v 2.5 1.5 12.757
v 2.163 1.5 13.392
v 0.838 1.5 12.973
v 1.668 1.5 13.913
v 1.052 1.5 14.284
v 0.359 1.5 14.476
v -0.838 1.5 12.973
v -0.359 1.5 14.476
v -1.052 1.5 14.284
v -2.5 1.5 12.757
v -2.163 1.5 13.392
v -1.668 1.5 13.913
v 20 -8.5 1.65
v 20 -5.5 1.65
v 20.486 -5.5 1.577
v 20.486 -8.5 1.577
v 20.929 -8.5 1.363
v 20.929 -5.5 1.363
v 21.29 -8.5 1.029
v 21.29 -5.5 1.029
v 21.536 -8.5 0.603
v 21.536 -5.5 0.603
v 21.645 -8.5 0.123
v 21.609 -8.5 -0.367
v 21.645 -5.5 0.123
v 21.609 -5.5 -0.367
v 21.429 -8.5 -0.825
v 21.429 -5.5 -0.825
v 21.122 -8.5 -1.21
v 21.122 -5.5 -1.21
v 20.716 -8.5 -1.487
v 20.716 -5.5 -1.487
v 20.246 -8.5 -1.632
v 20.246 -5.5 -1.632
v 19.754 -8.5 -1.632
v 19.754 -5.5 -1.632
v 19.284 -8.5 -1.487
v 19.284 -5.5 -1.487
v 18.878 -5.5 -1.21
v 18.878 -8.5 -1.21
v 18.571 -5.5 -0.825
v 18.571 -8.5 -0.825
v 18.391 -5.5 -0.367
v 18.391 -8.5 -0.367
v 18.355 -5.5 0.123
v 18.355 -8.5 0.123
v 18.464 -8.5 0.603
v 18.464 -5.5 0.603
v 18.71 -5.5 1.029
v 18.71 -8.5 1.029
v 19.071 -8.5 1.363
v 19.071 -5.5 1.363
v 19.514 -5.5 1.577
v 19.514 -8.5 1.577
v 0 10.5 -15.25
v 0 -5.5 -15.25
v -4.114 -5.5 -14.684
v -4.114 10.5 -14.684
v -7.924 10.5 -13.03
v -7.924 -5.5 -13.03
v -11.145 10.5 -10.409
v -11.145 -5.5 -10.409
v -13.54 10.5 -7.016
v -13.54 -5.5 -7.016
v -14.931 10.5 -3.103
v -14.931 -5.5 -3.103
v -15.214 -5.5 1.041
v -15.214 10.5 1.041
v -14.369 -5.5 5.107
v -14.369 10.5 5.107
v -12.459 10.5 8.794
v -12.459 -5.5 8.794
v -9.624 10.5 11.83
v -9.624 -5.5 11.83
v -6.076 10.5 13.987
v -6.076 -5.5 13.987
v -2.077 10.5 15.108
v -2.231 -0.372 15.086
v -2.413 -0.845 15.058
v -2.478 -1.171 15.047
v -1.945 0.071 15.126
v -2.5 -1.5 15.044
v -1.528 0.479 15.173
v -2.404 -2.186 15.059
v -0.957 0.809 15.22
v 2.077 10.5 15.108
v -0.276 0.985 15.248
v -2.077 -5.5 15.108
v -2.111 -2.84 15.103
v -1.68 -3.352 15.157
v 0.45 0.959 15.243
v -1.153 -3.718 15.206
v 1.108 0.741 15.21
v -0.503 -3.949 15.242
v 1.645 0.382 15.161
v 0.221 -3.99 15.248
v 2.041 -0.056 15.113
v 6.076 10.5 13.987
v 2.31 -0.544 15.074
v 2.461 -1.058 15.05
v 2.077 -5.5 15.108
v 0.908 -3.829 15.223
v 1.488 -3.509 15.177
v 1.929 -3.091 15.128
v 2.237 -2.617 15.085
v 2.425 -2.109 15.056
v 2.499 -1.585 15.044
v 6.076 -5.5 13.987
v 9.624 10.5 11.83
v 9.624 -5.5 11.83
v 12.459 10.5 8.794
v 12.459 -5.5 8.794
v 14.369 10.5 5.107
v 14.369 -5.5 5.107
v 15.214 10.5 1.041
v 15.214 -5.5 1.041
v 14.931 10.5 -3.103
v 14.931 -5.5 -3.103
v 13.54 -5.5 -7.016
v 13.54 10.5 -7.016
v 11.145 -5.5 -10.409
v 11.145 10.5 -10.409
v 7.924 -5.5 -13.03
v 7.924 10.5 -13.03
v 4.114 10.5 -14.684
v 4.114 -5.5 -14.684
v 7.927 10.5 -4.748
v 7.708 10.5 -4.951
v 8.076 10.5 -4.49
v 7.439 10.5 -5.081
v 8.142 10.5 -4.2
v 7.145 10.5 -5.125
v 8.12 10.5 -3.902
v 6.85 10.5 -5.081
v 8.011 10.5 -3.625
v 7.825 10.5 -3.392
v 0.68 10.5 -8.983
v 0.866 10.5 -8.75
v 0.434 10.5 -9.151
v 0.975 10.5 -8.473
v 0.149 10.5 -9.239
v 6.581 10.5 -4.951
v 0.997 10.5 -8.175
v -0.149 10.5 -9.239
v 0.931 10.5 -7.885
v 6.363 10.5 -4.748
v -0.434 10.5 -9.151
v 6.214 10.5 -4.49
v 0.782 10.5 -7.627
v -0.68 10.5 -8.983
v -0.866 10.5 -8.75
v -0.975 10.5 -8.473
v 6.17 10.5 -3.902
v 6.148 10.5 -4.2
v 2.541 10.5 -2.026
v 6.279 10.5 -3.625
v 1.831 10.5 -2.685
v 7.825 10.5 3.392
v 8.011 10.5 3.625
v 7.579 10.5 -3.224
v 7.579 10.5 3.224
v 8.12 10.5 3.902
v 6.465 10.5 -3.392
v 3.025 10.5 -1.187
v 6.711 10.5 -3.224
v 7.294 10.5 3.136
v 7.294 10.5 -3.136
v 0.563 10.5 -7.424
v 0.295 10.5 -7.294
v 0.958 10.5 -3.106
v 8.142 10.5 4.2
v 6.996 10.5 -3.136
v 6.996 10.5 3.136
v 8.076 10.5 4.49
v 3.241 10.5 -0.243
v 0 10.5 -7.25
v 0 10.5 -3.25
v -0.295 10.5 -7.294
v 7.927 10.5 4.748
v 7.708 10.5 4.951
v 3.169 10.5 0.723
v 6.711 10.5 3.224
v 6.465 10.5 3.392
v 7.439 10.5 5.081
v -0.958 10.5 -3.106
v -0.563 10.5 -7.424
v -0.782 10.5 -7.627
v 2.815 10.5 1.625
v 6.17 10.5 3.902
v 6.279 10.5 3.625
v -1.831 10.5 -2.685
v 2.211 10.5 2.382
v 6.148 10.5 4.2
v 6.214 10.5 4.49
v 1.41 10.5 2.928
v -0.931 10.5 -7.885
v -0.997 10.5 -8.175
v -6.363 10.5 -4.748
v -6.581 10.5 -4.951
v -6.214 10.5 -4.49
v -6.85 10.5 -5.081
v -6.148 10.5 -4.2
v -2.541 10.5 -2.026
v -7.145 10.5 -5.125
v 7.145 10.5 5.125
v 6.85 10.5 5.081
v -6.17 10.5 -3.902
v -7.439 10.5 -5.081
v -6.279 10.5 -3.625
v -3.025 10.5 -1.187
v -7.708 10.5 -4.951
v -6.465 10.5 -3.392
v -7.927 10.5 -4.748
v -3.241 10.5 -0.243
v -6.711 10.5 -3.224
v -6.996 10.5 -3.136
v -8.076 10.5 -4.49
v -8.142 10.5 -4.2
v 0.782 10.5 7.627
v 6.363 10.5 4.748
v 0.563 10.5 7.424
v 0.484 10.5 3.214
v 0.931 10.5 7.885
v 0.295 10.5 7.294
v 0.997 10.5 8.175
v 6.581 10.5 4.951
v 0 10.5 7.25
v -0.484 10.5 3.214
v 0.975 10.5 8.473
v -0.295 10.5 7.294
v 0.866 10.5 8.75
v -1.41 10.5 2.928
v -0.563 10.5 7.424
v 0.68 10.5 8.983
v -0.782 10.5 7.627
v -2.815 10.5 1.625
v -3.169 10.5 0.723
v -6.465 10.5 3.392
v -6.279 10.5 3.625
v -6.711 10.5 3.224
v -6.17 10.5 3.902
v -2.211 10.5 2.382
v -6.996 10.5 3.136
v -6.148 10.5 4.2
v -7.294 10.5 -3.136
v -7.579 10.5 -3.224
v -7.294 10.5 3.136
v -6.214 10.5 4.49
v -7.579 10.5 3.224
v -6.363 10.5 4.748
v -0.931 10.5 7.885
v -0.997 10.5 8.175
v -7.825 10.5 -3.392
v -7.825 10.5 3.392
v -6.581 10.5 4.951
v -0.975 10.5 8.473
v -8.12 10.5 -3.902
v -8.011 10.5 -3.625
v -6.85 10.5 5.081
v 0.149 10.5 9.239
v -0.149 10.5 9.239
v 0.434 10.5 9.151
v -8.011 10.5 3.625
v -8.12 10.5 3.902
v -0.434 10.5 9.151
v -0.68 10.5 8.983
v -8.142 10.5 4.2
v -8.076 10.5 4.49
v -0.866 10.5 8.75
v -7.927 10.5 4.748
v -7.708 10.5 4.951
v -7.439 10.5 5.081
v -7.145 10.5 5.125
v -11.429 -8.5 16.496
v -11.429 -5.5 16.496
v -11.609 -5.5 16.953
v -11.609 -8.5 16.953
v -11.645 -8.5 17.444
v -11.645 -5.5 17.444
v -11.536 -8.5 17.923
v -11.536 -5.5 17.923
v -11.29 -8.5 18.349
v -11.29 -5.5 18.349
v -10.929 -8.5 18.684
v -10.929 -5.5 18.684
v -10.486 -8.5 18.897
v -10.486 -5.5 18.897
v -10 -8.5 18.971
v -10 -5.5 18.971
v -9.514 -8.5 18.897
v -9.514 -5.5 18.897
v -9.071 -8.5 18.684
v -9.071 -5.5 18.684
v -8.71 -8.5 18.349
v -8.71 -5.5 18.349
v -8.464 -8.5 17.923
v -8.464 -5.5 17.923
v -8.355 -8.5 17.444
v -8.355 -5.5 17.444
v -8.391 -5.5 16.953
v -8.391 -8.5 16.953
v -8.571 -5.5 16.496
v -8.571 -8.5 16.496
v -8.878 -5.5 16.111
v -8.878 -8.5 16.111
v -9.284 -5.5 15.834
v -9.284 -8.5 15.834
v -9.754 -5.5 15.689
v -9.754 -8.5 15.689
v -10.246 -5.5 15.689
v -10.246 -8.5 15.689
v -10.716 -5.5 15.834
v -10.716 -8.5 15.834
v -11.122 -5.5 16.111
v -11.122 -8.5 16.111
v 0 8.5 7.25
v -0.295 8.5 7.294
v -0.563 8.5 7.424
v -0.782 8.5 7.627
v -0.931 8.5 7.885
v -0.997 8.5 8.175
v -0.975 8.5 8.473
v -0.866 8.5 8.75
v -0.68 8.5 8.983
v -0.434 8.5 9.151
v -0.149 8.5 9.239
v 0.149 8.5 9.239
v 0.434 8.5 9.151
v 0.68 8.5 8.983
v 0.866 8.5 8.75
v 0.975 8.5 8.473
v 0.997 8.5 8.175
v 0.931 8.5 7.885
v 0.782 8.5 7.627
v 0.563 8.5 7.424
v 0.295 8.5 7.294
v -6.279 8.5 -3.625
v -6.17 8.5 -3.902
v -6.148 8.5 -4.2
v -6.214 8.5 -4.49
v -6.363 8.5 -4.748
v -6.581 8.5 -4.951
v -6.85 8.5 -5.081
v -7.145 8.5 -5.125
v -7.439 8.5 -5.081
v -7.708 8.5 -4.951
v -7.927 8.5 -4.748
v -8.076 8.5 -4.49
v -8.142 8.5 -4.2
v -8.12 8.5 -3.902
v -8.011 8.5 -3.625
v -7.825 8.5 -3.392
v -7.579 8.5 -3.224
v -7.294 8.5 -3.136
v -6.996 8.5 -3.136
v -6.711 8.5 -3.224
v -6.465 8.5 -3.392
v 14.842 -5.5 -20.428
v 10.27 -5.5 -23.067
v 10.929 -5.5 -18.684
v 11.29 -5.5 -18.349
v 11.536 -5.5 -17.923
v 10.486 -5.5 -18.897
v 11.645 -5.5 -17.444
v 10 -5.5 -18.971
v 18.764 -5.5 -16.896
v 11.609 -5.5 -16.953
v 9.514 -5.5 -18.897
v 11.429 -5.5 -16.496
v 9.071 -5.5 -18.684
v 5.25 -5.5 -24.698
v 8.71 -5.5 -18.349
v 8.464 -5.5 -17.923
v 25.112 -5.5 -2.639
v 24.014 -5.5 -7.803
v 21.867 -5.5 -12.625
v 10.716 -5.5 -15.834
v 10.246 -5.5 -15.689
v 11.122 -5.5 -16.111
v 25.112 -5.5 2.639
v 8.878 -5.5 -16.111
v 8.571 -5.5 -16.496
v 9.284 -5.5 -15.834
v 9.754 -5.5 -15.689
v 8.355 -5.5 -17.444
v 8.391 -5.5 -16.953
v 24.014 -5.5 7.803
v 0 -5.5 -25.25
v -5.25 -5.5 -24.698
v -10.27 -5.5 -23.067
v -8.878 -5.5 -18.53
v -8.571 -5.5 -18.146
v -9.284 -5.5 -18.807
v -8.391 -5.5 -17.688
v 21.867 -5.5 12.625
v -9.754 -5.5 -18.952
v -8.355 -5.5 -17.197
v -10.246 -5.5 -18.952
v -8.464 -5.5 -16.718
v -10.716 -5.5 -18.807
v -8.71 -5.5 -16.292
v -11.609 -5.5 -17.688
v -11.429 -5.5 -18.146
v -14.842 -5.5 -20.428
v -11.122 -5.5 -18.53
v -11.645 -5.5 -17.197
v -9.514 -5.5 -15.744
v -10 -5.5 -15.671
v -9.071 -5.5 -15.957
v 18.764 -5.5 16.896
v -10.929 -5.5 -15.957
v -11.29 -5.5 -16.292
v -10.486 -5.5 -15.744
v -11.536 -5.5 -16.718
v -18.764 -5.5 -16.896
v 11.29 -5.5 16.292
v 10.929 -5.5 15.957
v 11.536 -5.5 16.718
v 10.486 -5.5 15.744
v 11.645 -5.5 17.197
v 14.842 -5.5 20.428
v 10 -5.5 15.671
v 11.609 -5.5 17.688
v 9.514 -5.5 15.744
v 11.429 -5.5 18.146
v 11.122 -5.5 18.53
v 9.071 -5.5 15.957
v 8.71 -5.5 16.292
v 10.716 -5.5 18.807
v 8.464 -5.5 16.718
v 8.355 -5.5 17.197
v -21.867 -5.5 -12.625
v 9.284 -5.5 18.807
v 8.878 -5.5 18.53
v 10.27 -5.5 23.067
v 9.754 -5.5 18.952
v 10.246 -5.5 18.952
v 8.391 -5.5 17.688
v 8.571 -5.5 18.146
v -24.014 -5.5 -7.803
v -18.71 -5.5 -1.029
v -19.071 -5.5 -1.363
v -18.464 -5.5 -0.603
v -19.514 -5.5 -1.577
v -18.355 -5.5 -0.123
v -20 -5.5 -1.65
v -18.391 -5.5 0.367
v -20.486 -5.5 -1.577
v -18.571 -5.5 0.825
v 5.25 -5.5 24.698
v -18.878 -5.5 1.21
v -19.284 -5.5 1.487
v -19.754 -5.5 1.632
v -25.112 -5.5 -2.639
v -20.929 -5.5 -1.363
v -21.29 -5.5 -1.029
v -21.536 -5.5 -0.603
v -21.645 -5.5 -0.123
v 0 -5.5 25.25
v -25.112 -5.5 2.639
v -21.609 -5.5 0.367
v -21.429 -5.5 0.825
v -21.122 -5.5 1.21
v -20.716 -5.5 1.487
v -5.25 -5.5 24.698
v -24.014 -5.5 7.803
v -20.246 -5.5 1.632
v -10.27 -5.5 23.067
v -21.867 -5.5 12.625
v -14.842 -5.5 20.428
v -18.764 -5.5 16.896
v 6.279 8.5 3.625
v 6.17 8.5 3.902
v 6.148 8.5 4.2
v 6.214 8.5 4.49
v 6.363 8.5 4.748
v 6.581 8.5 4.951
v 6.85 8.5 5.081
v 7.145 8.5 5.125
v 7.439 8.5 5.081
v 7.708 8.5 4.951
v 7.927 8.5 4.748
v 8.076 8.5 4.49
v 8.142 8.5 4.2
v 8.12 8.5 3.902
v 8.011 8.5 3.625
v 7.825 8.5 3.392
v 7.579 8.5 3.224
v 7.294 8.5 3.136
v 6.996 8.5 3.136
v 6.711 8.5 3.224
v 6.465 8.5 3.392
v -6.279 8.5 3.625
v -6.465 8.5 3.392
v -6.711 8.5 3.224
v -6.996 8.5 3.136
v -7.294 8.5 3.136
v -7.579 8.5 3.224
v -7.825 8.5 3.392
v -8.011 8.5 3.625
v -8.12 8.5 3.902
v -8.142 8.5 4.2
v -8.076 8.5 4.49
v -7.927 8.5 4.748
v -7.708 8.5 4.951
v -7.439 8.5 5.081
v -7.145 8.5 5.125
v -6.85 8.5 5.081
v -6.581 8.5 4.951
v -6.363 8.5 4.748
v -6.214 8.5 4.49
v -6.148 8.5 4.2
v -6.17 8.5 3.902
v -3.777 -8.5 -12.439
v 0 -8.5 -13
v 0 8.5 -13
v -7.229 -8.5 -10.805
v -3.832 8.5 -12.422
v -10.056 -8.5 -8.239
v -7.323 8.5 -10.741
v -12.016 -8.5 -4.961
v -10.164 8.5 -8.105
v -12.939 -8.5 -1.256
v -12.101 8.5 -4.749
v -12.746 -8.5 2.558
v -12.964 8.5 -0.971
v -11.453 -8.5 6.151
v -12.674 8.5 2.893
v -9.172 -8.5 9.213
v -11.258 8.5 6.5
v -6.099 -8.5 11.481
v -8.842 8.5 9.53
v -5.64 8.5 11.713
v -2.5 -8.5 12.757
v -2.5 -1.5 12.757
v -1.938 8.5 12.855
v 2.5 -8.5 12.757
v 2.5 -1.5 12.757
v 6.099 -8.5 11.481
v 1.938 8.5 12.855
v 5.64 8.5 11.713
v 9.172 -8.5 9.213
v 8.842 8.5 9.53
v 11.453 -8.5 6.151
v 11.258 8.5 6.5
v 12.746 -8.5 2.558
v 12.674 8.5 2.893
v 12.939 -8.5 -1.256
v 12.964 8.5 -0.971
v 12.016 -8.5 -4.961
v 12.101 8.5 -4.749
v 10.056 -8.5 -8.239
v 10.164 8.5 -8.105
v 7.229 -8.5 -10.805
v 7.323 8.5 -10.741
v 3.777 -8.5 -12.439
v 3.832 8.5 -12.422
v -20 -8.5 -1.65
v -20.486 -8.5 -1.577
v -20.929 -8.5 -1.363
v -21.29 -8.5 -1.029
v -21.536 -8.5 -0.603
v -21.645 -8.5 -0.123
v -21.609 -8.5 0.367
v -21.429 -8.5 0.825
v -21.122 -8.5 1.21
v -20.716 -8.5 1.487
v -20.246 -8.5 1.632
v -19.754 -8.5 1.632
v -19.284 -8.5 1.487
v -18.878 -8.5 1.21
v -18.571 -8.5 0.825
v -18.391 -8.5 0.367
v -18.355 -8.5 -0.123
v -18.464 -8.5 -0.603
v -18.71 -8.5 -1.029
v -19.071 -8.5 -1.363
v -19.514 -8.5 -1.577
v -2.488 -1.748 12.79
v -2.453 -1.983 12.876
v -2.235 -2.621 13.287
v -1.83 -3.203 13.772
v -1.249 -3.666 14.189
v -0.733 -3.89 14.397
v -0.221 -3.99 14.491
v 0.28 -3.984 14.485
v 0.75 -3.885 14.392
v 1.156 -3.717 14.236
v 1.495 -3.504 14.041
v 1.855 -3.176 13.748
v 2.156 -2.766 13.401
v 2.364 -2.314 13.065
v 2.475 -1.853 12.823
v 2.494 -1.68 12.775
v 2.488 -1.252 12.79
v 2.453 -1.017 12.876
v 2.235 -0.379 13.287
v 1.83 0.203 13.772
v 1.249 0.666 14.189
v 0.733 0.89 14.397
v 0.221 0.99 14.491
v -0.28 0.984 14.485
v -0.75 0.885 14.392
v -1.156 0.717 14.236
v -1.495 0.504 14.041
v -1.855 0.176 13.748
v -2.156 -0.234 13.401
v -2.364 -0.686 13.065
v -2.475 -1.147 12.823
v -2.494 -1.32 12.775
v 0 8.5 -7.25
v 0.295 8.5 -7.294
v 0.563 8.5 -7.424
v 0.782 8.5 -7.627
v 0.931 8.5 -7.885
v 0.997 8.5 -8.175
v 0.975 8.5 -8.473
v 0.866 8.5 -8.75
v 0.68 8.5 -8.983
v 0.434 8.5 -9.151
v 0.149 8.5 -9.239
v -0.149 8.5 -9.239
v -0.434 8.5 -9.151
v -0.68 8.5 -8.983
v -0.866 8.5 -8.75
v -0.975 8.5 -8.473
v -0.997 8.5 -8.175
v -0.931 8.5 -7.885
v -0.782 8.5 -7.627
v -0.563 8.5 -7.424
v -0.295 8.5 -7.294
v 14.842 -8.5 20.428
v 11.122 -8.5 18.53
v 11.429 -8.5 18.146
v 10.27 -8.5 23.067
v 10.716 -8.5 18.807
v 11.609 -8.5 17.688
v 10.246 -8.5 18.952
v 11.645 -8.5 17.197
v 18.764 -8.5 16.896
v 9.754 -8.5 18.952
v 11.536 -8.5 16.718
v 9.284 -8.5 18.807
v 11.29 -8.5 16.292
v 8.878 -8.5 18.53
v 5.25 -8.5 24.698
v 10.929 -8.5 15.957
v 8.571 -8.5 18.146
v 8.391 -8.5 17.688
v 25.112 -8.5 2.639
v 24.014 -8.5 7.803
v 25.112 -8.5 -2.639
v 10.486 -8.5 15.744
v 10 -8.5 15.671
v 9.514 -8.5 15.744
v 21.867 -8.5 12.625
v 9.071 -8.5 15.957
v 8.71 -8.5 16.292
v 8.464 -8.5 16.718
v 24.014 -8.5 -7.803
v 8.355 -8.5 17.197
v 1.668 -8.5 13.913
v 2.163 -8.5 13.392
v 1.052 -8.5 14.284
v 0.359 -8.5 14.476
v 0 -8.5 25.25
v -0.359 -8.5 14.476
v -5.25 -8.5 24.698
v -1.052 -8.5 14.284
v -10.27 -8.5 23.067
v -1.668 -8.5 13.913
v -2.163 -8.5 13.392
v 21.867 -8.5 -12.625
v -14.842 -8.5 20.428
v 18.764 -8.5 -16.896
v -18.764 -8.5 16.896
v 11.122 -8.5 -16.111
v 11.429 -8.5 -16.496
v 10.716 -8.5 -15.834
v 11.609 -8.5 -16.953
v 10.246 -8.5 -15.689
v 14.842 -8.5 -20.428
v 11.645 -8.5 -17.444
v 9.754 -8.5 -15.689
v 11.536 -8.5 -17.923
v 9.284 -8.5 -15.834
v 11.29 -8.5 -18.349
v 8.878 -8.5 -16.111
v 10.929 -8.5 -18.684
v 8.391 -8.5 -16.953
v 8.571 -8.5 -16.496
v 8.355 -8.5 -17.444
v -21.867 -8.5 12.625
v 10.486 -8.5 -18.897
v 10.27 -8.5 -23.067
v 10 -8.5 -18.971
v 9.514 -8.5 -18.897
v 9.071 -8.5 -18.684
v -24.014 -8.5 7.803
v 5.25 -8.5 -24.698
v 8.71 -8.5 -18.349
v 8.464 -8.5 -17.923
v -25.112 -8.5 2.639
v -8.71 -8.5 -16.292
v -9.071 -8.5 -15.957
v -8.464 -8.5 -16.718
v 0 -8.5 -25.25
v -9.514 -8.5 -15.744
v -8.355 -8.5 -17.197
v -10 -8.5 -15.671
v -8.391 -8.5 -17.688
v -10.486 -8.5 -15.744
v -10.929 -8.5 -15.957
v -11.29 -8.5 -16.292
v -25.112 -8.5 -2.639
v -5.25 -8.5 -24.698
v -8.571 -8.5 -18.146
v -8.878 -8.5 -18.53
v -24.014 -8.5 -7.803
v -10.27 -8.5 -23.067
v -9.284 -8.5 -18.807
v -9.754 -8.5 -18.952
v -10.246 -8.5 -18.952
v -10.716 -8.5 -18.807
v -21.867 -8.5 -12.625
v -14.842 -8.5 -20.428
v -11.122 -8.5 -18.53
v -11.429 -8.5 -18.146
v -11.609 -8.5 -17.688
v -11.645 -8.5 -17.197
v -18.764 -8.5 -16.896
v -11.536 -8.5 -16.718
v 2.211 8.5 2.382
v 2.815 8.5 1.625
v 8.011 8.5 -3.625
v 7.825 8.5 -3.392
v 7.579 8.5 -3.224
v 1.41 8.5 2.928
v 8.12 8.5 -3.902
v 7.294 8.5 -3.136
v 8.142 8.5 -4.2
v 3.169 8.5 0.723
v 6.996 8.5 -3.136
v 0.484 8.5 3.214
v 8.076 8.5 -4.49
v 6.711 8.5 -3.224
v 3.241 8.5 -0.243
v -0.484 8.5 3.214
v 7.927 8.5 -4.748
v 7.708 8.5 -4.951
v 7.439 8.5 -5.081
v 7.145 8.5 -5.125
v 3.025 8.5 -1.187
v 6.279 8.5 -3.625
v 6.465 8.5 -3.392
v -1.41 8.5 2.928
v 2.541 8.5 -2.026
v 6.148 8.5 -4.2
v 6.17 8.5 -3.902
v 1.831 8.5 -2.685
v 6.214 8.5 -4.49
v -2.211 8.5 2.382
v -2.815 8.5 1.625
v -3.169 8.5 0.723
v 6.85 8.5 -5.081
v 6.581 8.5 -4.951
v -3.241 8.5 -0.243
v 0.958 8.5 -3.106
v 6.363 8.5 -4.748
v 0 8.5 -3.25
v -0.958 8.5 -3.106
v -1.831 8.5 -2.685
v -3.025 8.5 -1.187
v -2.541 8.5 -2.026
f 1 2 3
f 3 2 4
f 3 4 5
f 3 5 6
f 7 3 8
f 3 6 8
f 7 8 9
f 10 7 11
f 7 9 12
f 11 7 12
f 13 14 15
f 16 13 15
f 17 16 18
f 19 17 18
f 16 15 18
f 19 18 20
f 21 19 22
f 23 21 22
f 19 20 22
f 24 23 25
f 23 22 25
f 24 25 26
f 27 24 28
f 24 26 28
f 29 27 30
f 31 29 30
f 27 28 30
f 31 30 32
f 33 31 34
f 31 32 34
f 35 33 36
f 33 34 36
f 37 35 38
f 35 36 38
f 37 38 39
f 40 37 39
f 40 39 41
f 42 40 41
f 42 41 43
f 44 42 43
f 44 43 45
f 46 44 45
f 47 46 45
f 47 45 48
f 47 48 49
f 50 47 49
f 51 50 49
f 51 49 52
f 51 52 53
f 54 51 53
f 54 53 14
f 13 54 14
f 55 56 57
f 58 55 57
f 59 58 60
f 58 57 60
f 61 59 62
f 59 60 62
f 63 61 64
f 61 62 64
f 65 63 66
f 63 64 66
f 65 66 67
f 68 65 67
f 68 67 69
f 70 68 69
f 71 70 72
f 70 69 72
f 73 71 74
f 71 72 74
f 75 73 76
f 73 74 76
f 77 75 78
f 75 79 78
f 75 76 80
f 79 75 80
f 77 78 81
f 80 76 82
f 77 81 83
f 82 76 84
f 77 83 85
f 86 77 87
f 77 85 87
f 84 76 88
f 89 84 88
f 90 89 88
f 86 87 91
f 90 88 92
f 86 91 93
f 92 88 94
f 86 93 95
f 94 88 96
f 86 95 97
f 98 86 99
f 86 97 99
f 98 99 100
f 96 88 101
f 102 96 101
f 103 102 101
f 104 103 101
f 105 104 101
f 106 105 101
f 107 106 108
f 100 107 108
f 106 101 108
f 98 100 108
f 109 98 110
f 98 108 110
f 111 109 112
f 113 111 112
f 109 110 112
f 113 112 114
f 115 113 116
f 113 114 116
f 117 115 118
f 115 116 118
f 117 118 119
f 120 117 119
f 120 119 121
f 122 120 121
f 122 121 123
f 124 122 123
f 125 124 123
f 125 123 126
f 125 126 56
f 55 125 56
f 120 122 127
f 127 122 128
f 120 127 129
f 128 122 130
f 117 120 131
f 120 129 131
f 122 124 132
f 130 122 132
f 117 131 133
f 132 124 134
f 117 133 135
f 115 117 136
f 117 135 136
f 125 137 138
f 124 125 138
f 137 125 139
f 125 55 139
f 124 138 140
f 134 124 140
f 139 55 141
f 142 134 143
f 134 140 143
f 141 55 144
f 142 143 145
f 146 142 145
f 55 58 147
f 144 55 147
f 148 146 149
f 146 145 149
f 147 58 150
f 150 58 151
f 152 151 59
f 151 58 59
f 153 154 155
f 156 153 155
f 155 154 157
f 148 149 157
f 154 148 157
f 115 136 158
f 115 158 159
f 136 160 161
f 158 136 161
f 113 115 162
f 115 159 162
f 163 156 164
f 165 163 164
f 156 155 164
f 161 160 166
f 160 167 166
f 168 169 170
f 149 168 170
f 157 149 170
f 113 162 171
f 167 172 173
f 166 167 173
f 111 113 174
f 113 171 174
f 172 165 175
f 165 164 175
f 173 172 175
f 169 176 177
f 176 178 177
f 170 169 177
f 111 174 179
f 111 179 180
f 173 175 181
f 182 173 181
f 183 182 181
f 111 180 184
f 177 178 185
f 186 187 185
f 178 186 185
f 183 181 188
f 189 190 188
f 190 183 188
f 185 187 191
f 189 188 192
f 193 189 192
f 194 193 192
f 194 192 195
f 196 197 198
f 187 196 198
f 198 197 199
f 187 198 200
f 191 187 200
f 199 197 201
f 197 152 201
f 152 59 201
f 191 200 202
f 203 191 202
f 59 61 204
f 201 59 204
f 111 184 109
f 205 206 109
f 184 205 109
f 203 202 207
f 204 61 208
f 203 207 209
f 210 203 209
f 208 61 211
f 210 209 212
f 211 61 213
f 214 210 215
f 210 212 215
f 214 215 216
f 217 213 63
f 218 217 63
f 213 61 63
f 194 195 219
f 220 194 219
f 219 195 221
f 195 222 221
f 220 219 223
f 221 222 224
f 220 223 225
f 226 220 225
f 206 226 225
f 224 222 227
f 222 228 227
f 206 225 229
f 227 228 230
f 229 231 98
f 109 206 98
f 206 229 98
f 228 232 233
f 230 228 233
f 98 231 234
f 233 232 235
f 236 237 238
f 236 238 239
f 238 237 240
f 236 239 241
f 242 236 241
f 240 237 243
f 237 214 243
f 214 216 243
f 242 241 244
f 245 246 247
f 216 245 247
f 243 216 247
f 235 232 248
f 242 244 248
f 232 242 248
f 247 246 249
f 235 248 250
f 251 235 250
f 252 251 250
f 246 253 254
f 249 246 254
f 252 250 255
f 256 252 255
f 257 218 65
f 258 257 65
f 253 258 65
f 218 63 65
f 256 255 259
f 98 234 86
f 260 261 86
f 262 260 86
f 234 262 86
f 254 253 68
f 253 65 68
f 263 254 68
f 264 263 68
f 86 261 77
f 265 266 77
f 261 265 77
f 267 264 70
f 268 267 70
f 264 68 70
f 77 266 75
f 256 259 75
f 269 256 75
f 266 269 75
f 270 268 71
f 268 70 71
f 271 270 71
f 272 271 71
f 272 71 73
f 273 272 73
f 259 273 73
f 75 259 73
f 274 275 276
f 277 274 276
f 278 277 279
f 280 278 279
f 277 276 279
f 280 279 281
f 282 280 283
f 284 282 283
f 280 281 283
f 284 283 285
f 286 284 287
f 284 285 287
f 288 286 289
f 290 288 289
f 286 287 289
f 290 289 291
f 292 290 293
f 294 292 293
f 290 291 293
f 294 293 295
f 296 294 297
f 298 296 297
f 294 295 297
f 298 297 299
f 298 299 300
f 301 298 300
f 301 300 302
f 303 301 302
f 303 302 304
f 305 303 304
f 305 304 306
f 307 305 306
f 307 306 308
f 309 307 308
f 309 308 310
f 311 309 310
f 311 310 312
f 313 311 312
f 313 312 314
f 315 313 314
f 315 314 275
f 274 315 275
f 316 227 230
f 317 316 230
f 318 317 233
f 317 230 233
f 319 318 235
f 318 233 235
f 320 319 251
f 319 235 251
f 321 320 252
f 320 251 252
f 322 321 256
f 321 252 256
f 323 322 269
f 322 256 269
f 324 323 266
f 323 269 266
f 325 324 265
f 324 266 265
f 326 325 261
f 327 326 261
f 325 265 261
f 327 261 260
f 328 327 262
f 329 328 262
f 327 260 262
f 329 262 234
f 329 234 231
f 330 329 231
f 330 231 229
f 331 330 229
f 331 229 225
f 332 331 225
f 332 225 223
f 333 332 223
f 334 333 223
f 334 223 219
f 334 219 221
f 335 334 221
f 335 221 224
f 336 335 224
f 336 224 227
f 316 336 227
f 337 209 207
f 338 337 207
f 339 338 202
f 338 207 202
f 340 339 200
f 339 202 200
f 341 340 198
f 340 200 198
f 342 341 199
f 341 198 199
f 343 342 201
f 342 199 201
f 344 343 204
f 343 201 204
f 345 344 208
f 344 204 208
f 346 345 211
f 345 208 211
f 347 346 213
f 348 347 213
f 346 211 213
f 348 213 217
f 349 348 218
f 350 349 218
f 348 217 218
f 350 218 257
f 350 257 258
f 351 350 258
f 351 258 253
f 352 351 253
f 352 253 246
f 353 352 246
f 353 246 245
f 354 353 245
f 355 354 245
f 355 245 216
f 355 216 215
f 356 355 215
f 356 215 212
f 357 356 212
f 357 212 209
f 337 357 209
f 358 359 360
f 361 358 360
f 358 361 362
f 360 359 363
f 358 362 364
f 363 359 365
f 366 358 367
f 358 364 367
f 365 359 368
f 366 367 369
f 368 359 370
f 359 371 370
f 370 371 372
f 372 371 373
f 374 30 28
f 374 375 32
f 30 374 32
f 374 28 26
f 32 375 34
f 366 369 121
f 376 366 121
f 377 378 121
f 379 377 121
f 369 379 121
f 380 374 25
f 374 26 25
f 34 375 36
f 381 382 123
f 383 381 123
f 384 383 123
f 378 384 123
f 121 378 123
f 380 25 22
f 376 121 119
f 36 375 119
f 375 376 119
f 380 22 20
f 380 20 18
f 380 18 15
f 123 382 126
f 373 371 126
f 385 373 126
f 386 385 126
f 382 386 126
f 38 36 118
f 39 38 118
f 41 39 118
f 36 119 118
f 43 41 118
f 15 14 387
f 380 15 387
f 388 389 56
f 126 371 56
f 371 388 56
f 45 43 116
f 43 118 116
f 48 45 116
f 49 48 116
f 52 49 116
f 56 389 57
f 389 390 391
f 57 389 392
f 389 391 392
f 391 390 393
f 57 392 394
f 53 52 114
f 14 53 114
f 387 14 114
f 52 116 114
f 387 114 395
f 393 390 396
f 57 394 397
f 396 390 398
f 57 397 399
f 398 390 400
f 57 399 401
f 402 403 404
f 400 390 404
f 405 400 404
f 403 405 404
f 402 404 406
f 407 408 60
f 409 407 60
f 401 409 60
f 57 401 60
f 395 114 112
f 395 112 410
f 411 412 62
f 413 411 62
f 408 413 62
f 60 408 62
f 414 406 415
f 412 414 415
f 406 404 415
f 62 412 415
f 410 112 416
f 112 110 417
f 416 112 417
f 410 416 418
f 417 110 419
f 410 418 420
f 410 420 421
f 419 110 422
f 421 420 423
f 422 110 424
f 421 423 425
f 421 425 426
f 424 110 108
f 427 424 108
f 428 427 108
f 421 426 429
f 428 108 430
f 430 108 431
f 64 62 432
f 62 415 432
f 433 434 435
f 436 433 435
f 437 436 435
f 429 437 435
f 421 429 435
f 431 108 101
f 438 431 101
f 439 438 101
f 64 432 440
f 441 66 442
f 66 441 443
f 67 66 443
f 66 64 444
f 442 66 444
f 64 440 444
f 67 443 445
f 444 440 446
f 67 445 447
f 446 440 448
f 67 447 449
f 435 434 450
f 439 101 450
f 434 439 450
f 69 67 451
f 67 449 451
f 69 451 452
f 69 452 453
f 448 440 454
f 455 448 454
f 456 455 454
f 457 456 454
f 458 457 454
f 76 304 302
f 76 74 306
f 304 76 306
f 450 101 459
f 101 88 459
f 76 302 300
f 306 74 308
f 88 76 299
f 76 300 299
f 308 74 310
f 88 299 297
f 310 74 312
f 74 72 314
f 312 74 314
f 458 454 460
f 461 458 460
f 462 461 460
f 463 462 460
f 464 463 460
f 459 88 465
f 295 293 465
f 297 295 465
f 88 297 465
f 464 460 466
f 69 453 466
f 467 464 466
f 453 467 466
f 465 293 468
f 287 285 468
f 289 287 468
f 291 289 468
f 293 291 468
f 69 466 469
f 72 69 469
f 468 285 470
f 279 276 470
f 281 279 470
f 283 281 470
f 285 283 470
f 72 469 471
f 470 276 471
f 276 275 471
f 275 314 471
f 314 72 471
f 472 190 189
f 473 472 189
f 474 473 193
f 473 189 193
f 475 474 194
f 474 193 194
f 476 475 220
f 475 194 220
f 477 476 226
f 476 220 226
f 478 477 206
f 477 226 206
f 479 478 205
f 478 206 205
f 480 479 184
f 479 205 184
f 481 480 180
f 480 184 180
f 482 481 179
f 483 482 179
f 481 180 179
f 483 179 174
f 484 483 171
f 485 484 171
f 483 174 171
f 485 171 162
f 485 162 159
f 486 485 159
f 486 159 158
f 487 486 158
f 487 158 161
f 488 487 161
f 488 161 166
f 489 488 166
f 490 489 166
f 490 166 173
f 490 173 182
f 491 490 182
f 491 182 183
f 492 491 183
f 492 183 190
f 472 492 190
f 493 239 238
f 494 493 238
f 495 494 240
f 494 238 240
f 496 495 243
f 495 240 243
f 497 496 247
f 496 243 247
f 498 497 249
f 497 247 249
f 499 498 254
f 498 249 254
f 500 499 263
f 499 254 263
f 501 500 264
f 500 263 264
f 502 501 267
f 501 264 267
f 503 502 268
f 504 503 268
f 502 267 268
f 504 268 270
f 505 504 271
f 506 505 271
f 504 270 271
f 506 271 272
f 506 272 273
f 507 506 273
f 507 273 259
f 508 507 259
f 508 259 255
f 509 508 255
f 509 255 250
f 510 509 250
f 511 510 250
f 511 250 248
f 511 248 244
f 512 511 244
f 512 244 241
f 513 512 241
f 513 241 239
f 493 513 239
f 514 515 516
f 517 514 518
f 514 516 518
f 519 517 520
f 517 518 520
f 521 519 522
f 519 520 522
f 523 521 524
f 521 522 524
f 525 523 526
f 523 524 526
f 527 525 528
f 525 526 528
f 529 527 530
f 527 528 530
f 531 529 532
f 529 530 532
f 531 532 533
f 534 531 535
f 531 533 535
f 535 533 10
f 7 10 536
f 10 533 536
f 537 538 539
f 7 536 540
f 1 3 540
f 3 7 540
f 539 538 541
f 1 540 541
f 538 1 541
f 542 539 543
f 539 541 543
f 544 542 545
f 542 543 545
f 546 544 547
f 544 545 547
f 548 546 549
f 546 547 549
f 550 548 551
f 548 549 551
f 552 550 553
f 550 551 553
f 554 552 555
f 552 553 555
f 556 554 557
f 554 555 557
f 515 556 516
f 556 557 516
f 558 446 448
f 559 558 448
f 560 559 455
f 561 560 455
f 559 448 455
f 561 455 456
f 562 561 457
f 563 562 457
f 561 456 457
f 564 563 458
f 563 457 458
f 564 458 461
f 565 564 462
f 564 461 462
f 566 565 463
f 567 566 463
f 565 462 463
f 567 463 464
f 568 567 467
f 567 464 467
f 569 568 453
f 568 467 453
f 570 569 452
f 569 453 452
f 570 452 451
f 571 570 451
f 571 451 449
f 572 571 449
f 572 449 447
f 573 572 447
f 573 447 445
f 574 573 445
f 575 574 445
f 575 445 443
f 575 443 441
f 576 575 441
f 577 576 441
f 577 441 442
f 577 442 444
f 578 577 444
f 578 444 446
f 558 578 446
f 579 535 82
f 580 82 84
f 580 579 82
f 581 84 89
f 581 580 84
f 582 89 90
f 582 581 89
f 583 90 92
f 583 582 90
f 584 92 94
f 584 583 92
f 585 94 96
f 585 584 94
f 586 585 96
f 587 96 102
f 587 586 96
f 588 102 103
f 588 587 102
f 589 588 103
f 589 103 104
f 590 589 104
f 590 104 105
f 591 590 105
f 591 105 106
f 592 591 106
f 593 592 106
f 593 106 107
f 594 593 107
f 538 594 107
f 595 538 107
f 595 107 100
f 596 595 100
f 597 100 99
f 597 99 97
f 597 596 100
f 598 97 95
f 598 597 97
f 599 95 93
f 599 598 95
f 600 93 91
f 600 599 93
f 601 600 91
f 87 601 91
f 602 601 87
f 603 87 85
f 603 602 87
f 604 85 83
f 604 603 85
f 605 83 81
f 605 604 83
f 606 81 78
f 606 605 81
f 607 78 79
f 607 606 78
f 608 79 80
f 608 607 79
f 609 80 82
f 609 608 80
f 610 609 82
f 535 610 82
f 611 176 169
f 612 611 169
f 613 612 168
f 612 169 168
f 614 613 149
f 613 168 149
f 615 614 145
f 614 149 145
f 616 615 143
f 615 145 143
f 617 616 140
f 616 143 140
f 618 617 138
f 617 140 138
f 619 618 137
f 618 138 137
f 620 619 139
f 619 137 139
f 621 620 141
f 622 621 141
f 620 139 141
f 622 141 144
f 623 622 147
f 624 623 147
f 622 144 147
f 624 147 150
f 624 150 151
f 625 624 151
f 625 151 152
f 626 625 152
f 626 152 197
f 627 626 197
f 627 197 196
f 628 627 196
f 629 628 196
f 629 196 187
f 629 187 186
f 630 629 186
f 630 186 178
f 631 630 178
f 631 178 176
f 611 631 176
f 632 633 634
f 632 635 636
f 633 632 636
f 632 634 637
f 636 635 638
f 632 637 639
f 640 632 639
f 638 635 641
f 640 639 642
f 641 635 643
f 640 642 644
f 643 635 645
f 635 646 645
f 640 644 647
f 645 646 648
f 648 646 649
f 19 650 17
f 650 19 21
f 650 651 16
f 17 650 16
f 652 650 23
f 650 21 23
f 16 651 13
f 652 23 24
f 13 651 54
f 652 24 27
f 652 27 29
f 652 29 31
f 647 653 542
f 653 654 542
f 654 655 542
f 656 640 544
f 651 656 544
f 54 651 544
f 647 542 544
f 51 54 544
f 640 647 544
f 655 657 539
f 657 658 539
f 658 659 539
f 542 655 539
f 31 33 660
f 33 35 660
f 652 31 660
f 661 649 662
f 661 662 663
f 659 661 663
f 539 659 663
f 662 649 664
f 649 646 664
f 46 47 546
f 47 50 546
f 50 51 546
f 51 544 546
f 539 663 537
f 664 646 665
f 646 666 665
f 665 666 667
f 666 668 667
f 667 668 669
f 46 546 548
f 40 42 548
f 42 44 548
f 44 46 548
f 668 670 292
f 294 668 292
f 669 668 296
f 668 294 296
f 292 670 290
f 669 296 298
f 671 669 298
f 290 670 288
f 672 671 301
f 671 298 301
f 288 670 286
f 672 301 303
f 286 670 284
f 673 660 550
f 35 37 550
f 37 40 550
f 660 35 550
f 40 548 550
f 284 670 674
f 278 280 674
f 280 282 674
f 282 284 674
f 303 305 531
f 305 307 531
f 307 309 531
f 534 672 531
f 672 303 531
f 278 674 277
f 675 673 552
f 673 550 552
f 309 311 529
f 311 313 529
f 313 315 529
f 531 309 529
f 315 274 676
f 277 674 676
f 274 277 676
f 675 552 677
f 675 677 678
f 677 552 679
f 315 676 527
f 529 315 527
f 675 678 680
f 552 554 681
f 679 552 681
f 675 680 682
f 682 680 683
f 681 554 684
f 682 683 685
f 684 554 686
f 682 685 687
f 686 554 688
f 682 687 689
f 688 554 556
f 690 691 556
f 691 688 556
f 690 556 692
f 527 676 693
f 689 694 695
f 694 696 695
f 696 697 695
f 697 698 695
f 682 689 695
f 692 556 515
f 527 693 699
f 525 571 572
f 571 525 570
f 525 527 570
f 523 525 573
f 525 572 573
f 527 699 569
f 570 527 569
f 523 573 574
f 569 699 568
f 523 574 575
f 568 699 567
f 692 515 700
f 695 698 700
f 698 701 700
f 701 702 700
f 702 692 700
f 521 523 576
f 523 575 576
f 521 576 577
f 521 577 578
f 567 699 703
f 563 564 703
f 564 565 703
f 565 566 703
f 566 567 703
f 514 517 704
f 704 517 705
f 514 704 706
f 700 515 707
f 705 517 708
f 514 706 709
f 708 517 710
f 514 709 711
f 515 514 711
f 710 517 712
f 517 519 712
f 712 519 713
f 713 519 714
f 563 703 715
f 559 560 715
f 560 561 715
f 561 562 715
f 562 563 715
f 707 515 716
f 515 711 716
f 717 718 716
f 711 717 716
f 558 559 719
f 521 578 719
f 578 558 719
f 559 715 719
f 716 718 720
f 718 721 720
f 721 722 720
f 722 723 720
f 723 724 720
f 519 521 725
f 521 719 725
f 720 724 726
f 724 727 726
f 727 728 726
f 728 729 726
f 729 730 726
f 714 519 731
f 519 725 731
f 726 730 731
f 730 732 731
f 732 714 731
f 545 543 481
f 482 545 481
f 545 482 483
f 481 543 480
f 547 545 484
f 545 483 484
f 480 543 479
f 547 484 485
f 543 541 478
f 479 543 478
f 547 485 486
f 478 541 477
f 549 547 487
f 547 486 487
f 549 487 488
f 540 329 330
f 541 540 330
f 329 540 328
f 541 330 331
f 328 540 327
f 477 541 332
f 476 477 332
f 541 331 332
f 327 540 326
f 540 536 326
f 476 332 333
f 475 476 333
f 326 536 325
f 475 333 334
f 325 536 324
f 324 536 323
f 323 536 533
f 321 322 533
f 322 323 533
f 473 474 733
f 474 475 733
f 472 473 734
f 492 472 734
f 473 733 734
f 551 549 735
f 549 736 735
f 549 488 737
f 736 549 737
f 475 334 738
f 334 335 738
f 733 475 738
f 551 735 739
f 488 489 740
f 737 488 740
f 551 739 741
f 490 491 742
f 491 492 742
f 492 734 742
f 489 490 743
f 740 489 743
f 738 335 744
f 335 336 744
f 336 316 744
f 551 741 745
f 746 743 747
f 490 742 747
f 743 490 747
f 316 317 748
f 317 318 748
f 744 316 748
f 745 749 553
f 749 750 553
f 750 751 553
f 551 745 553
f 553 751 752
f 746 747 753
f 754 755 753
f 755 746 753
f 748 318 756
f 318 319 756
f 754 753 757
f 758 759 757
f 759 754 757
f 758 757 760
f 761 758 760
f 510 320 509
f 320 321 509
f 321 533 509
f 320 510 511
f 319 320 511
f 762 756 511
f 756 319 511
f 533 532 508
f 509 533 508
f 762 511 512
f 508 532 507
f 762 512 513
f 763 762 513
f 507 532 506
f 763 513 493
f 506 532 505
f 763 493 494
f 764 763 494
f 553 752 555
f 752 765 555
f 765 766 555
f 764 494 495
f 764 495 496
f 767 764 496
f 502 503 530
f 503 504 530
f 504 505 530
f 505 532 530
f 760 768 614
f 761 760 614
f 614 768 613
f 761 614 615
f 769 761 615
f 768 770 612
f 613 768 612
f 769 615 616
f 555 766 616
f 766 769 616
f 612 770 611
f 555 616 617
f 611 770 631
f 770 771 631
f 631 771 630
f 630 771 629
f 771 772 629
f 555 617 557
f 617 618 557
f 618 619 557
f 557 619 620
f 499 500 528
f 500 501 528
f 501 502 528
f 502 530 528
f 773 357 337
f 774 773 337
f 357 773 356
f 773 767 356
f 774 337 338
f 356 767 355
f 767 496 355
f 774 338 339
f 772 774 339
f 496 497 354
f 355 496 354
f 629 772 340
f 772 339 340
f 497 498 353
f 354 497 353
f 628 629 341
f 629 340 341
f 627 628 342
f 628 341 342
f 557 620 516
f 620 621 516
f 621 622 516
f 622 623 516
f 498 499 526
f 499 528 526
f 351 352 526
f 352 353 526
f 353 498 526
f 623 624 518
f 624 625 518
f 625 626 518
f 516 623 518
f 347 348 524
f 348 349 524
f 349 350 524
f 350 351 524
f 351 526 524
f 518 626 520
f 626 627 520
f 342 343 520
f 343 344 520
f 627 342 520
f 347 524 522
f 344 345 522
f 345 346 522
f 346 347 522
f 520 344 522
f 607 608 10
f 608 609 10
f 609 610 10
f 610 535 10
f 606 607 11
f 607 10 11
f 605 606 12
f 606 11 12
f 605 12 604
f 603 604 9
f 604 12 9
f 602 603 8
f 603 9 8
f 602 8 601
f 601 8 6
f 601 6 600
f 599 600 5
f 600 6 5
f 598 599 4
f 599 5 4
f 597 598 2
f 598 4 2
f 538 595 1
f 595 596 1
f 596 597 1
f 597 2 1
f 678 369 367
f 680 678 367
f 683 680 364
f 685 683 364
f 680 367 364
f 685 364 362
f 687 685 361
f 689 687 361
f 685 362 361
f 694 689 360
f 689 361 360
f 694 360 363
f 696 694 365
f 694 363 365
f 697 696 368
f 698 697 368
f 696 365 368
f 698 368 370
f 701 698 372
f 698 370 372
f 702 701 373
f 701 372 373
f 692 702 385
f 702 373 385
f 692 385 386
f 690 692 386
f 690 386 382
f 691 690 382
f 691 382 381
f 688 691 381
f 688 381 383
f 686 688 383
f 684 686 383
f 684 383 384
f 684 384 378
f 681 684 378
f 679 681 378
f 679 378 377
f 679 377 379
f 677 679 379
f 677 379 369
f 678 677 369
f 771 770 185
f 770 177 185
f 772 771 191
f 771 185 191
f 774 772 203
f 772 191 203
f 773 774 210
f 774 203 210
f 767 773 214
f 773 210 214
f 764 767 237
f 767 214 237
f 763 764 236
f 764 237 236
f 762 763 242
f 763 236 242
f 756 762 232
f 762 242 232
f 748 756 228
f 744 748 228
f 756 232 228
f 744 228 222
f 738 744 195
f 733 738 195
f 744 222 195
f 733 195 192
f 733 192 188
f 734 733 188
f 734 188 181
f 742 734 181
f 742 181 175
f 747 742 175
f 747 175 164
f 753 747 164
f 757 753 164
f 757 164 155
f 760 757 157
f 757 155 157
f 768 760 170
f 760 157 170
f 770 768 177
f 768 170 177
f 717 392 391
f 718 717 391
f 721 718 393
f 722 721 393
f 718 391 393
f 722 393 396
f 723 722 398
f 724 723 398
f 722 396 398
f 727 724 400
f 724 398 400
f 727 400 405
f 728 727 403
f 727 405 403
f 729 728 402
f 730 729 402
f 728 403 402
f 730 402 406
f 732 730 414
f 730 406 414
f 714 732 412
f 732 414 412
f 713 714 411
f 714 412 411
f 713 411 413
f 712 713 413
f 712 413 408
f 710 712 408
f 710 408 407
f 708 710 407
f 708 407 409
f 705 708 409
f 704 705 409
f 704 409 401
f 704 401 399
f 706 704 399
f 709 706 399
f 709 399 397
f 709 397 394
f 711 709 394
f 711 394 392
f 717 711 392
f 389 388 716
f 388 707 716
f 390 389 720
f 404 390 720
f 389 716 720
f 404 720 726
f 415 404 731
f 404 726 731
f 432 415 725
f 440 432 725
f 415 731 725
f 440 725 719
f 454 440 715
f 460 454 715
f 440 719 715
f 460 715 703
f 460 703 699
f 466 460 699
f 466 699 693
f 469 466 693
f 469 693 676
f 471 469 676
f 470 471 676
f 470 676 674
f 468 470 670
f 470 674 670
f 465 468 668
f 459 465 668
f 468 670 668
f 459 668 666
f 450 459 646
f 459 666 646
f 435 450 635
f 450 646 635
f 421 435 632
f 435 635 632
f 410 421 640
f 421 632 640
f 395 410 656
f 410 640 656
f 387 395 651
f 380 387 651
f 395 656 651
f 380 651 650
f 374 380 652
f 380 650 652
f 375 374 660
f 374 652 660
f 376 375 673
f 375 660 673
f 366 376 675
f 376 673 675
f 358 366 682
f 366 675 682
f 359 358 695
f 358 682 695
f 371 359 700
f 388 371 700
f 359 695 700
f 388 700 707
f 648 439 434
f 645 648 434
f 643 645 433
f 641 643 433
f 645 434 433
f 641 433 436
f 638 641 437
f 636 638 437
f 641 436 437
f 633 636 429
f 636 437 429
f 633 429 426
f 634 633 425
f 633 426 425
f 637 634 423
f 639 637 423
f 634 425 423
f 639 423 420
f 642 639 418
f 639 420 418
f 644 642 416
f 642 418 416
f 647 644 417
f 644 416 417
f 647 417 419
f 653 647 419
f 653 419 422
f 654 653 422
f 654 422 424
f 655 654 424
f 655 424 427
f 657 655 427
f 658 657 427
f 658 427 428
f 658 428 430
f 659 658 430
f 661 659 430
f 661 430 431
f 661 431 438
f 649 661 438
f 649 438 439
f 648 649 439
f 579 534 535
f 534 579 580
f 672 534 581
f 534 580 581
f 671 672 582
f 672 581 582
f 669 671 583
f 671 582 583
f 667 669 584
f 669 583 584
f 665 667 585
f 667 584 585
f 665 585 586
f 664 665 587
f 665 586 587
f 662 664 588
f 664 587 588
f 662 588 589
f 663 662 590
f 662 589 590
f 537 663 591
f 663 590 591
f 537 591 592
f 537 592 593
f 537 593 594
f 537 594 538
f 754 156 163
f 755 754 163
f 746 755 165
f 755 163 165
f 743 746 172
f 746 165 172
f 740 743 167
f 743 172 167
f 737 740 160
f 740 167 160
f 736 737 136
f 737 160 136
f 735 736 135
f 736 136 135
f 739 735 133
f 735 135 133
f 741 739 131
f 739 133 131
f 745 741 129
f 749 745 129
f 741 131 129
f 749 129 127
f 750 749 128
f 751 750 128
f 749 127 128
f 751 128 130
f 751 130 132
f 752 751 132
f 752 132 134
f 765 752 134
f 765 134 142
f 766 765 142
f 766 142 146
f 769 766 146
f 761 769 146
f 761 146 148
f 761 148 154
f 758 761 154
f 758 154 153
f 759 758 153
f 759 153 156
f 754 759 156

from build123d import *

# Parameters (mm, degrees)
SKETCH2_R          = 1
SKETCH2_R_2        = 1.65
CUT_EXTRUDE1_DEPTH = 41.449042016
CIRPATTERN1_COUNT  = 6
SKETCH3_R          = 2.5
CUT_EXTRUDE2_DEPTH = 38.220626002
CUT_EXTRUDE3_START = -10
CUT_EXTRUDE3_DEPTH = 10


with BuildPart() as part:
    # Sketch1 → Revolve1 (revolve)
    with BuildSketch(Plane.XY, mode=Mode.PRIVATE) as revolve1_sk:
        Polygon((3.25, 8.5), (3.25, 10.5), (15.25, 10.5), (15.25, -5.5), (25.25, -5.5), (25.25, -8.5), (13, -8.5), (13, 8.5), align=None)
    revolve(revolve1_sk.sketch.rotate(Axis((0, -8.78125, 0), (0, 1, 0)), 90), axis=Axis((0, -8.78125, 0), (0, 1, 0)))

    # Sketch2 → Cut-Extrude1 (cut, through all)
    with BuildSketch(Plane(origin=(0, 10.5, 0), x_dir=(1, 0, 0), z_dir=(0, 1, 0))):
        with Locations(Location((0, 8.25, 0), (0, 0, 270))):
            Circle(SKETCH2_R)
        with Locations(Location((20, 0, 0), (0, 0, 270))):
            Circle(SKETCH2_R_2)
    cut_extrude1 = extrude(amount=-CUT_EXTRUDE1_DEPTH, mode=Mode.SUBTRACT)

    # CirPattern1: Cut-Extrude1 ×6 about axis
    cirpattern1_axis = Axis((0, 0, 0), (0, 1, 0))
    for i in range(1, CIRPATTERN1_COUNT):
        add(cut_extrude1.rotate(cirpattern1_axis, i * 360 / CIRPATTERN1_COUNT), mode=Mode.SUBTRACT)

    # Sketch3 → Cut-Extrude2 (cut, through all)
    with BuildSketch(Plane.XY):
        with Locations(Location((0, -1.5, 0), (0, 0, 180))):
            Circle(SKETCH3_R)
    extrude(amount=CUT_EXTRUDE2_DEPTH, mode=Mode.SUBTRACT)

    # Sketch4 → Cut-Extrude3 (cut)
    with BuildSketch(Plane.XZ.offset(8.5).offset(CUT_EXTRUDE3_START)):
        with BuildLine():
            ThreePointArc((2.5, 12.757350822), (0, 13), (-2.5, 12.757350822))
            ThreePointArc((-2.5, 12.757350822), (0, 14.5), (2.5, 12.757350822))
        make_face()
    extrude(amount=CUT_EXTRUDE3_DEPTH, mode=Mode.SUBTRACT)


solid = part.part
